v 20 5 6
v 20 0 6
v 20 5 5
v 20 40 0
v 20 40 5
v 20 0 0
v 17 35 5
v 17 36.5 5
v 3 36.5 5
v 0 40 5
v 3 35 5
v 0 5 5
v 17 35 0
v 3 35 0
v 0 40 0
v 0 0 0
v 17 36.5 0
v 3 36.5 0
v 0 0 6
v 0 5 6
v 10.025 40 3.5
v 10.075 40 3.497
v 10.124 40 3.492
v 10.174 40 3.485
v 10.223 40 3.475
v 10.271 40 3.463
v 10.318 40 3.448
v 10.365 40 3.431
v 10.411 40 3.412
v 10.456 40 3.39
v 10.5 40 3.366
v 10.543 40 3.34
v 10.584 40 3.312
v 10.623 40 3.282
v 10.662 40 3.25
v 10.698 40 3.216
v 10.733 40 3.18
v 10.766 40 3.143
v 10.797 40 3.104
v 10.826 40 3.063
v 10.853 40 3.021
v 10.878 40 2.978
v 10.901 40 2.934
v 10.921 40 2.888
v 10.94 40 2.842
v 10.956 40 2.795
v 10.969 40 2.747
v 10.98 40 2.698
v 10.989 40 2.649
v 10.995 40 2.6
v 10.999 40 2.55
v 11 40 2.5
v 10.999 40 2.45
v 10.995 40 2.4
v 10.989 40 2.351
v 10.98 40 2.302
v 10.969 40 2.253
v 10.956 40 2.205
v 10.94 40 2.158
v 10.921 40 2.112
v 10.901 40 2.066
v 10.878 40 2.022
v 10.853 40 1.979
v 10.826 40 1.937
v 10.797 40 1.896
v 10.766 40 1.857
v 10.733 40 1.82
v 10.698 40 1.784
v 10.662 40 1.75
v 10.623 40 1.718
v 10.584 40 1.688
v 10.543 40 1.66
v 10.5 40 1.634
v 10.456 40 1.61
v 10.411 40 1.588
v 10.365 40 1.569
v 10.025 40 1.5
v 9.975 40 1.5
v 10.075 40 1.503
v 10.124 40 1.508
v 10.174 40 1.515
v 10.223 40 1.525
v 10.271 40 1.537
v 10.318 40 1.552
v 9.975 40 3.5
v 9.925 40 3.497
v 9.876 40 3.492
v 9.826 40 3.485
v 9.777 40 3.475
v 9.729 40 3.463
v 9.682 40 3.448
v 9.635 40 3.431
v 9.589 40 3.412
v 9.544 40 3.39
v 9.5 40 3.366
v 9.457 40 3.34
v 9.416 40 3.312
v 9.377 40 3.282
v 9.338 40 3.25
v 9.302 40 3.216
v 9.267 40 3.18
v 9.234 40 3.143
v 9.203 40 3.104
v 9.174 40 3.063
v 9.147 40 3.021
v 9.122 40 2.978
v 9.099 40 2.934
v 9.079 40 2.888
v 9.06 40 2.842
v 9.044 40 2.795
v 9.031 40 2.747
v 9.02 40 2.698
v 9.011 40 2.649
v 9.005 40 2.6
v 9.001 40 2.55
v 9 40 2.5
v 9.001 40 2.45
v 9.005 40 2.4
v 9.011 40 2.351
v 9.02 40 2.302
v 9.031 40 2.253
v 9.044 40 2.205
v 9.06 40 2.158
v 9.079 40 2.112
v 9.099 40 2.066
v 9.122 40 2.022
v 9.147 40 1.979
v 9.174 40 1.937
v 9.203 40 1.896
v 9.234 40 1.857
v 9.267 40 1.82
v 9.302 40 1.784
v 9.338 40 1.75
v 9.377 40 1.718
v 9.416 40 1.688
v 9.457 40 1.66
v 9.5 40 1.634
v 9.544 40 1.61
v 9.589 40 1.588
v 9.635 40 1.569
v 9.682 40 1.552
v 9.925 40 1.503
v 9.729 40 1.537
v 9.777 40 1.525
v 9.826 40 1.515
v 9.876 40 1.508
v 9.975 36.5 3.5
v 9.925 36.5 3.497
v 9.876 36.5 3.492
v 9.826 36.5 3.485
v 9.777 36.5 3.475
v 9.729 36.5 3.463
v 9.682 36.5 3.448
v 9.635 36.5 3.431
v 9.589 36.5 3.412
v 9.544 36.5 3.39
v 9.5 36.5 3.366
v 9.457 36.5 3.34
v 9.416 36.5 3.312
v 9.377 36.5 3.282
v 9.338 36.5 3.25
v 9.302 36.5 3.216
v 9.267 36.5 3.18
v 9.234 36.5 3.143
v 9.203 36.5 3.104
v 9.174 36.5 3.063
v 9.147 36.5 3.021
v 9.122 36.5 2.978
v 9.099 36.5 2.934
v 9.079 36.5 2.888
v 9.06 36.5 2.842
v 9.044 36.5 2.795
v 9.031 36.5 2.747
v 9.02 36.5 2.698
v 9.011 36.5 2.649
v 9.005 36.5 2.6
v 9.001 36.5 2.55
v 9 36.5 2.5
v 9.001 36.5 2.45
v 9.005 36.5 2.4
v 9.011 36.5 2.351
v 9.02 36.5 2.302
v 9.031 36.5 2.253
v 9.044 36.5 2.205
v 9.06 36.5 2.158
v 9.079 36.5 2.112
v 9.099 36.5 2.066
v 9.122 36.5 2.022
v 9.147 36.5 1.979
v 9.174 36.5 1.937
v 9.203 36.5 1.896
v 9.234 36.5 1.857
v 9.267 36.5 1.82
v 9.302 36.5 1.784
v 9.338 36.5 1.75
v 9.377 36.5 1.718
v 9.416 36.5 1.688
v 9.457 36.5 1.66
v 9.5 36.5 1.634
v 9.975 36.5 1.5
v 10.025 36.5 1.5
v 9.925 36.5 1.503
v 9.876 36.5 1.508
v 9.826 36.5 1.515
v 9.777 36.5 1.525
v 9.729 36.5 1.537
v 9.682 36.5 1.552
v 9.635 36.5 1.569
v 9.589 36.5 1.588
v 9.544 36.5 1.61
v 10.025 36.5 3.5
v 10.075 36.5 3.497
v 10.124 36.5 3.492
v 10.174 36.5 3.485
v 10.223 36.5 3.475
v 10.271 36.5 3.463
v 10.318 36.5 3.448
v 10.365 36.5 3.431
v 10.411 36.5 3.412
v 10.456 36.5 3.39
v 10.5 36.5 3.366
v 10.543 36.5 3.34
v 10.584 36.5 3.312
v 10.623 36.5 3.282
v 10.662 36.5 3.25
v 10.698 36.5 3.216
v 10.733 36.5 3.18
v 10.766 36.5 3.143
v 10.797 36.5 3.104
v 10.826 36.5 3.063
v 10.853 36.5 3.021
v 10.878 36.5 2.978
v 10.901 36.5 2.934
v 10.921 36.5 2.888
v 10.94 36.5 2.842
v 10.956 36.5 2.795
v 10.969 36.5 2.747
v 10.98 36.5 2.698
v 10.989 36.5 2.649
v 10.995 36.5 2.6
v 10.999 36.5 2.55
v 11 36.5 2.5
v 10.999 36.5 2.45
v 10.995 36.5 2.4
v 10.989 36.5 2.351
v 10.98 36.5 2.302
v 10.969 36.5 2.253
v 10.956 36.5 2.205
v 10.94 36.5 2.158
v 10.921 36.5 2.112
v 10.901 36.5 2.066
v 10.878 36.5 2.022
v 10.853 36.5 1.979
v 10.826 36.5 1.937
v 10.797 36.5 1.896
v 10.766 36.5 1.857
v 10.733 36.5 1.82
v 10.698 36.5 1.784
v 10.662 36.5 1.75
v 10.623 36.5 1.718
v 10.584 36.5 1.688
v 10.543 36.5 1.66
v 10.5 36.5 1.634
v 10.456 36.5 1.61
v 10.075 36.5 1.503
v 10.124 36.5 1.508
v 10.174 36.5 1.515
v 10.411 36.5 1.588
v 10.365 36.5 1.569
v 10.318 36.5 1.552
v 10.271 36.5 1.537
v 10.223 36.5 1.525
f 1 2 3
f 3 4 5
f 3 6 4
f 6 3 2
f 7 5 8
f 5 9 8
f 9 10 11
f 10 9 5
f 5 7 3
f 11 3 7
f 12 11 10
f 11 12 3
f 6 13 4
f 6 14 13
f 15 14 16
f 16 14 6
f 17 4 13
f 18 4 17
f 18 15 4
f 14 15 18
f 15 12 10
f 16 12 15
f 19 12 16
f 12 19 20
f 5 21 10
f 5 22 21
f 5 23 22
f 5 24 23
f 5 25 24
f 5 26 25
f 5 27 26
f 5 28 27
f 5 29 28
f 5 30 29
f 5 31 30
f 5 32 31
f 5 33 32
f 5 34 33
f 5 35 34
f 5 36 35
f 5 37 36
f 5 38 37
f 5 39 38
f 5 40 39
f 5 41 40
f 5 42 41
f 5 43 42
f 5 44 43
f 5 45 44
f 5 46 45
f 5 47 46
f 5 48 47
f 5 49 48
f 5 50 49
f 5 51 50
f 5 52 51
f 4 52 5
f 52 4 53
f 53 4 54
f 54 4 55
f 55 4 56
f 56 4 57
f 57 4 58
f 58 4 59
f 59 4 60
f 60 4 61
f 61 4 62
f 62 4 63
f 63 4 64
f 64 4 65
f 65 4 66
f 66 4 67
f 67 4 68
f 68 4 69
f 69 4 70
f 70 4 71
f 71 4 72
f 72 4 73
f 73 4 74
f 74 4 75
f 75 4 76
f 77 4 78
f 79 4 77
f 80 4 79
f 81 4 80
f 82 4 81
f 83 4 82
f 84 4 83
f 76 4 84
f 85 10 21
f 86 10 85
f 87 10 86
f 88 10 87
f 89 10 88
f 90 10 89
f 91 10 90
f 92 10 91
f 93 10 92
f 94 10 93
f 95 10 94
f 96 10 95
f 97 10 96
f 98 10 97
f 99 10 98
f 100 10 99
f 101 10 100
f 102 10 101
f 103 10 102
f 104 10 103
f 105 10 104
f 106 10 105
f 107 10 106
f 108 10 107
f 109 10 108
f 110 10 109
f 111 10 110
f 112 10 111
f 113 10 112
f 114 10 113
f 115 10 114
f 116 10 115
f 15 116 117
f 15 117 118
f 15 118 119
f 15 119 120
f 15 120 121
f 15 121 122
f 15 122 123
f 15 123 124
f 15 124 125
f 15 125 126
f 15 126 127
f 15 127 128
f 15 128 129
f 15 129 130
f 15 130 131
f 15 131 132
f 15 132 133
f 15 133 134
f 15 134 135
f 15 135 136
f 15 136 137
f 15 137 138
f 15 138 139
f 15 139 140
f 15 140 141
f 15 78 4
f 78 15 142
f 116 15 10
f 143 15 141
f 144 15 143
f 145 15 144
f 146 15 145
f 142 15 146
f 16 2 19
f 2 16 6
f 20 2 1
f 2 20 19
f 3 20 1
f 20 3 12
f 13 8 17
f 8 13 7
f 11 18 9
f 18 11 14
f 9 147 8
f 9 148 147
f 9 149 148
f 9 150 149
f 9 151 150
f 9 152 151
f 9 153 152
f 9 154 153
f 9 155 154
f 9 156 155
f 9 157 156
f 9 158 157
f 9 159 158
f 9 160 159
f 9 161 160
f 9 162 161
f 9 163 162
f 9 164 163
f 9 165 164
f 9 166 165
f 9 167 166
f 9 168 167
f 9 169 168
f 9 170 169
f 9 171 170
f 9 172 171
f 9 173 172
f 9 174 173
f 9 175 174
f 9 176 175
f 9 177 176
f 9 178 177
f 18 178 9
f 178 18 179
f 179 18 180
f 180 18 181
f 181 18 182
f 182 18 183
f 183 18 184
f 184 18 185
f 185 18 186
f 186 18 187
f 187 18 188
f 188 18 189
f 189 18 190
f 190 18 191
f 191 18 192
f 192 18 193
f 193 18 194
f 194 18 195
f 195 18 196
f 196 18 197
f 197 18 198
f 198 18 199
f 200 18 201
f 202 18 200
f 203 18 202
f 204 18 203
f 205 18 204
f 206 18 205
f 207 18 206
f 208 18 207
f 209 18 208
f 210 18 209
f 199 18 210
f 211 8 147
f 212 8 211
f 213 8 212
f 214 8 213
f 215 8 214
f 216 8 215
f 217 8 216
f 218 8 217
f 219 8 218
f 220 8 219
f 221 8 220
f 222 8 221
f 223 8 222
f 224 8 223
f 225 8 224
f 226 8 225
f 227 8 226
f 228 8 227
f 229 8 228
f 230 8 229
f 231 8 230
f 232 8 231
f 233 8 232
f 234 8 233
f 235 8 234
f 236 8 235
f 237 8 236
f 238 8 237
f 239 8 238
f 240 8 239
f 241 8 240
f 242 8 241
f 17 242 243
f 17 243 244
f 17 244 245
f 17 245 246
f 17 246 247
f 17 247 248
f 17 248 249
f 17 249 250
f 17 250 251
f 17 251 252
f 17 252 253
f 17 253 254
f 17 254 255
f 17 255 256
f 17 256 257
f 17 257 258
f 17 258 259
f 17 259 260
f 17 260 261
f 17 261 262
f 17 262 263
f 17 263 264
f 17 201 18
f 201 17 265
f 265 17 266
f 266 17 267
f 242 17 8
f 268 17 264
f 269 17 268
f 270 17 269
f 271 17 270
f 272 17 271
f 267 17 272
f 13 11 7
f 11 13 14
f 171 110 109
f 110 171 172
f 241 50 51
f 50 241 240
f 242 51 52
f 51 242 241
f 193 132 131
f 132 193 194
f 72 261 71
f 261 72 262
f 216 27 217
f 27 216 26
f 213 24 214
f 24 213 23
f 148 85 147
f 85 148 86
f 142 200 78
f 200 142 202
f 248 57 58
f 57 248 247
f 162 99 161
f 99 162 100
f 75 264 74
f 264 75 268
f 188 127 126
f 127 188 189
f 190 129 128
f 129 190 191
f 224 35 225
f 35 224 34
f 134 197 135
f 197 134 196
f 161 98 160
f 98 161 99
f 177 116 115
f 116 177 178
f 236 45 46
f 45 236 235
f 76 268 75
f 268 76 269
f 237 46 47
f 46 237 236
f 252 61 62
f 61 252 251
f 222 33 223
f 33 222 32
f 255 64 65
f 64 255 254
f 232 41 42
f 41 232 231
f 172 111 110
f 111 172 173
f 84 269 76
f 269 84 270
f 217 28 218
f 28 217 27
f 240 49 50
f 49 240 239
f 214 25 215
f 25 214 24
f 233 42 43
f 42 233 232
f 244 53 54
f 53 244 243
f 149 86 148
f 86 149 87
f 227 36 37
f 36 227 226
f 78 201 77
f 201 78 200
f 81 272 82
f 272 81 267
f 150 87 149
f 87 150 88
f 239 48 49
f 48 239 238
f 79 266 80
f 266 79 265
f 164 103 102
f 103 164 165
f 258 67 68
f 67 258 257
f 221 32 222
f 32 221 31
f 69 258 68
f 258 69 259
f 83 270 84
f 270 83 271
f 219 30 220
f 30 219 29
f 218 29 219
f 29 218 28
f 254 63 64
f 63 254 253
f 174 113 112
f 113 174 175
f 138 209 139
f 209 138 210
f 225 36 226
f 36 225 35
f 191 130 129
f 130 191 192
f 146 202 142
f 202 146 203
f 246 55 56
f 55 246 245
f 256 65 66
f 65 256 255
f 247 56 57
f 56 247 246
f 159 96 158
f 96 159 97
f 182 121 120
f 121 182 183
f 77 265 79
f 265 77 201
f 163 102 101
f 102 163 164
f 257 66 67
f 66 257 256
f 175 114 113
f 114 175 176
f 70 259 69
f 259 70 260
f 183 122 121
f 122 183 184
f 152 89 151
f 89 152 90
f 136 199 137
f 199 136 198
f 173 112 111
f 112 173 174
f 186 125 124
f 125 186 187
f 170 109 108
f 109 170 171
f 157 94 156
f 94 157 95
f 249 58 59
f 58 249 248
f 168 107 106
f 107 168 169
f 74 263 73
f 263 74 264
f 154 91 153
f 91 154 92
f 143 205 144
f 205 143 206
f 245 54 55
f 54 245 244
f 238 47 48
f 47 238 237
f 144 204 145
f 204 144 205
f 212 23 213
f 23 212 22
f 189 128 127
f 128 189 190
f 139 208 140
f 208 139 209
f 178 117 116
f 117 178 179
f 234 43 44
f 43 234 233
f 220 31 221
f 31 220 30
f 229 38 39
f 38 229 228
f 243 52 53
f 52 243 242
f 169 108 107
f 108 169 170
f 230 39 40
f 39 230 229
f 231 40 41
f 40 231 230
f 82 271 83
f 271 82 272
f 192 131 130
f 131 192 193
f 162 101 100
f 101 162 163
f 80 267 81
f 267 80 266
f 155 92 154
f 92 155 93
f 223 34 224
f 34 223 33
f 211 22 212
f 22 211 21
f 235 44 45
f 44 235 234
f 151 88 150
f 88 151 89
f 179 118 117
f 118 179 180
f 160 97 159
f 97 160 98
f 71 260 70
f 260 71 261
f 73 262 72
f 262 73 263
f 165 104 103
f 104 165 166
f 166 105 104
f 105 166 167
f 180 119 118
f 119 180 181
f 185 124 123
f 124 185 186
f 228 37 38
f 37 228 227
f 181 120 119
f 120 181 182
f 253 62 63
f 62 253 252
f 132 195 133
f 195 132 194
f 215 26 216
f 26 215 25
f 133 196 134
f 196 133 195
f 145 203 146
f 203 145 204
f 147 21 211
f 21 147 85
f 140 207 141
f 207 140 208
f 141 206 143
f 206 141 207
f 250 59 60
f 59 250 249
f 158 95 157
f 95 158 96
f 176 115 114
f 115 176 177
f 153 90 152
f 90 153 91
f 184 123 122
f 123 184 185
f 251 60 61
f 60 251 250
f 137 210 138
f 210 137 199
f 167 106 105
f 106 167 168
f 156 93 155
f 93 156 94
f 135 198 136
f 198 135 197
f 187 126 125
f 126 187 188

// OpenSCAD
$fa=0.5; // default minimum facet angle is now 0.5
$fs=0.05; // default minimum facet size is now 0.05 mm

difference() {
  union() {
    cube([20, 40, 5]);
    cube([20, 5, 6]);
  }

  union() {
    translate([3, 35, -.1]) cube([14, 1.5, 5.2]);
    #translate([10, 45, 2.5]) rotate([90, 0, 0]) cylinder(r = 1, h = 9);
  }
}
